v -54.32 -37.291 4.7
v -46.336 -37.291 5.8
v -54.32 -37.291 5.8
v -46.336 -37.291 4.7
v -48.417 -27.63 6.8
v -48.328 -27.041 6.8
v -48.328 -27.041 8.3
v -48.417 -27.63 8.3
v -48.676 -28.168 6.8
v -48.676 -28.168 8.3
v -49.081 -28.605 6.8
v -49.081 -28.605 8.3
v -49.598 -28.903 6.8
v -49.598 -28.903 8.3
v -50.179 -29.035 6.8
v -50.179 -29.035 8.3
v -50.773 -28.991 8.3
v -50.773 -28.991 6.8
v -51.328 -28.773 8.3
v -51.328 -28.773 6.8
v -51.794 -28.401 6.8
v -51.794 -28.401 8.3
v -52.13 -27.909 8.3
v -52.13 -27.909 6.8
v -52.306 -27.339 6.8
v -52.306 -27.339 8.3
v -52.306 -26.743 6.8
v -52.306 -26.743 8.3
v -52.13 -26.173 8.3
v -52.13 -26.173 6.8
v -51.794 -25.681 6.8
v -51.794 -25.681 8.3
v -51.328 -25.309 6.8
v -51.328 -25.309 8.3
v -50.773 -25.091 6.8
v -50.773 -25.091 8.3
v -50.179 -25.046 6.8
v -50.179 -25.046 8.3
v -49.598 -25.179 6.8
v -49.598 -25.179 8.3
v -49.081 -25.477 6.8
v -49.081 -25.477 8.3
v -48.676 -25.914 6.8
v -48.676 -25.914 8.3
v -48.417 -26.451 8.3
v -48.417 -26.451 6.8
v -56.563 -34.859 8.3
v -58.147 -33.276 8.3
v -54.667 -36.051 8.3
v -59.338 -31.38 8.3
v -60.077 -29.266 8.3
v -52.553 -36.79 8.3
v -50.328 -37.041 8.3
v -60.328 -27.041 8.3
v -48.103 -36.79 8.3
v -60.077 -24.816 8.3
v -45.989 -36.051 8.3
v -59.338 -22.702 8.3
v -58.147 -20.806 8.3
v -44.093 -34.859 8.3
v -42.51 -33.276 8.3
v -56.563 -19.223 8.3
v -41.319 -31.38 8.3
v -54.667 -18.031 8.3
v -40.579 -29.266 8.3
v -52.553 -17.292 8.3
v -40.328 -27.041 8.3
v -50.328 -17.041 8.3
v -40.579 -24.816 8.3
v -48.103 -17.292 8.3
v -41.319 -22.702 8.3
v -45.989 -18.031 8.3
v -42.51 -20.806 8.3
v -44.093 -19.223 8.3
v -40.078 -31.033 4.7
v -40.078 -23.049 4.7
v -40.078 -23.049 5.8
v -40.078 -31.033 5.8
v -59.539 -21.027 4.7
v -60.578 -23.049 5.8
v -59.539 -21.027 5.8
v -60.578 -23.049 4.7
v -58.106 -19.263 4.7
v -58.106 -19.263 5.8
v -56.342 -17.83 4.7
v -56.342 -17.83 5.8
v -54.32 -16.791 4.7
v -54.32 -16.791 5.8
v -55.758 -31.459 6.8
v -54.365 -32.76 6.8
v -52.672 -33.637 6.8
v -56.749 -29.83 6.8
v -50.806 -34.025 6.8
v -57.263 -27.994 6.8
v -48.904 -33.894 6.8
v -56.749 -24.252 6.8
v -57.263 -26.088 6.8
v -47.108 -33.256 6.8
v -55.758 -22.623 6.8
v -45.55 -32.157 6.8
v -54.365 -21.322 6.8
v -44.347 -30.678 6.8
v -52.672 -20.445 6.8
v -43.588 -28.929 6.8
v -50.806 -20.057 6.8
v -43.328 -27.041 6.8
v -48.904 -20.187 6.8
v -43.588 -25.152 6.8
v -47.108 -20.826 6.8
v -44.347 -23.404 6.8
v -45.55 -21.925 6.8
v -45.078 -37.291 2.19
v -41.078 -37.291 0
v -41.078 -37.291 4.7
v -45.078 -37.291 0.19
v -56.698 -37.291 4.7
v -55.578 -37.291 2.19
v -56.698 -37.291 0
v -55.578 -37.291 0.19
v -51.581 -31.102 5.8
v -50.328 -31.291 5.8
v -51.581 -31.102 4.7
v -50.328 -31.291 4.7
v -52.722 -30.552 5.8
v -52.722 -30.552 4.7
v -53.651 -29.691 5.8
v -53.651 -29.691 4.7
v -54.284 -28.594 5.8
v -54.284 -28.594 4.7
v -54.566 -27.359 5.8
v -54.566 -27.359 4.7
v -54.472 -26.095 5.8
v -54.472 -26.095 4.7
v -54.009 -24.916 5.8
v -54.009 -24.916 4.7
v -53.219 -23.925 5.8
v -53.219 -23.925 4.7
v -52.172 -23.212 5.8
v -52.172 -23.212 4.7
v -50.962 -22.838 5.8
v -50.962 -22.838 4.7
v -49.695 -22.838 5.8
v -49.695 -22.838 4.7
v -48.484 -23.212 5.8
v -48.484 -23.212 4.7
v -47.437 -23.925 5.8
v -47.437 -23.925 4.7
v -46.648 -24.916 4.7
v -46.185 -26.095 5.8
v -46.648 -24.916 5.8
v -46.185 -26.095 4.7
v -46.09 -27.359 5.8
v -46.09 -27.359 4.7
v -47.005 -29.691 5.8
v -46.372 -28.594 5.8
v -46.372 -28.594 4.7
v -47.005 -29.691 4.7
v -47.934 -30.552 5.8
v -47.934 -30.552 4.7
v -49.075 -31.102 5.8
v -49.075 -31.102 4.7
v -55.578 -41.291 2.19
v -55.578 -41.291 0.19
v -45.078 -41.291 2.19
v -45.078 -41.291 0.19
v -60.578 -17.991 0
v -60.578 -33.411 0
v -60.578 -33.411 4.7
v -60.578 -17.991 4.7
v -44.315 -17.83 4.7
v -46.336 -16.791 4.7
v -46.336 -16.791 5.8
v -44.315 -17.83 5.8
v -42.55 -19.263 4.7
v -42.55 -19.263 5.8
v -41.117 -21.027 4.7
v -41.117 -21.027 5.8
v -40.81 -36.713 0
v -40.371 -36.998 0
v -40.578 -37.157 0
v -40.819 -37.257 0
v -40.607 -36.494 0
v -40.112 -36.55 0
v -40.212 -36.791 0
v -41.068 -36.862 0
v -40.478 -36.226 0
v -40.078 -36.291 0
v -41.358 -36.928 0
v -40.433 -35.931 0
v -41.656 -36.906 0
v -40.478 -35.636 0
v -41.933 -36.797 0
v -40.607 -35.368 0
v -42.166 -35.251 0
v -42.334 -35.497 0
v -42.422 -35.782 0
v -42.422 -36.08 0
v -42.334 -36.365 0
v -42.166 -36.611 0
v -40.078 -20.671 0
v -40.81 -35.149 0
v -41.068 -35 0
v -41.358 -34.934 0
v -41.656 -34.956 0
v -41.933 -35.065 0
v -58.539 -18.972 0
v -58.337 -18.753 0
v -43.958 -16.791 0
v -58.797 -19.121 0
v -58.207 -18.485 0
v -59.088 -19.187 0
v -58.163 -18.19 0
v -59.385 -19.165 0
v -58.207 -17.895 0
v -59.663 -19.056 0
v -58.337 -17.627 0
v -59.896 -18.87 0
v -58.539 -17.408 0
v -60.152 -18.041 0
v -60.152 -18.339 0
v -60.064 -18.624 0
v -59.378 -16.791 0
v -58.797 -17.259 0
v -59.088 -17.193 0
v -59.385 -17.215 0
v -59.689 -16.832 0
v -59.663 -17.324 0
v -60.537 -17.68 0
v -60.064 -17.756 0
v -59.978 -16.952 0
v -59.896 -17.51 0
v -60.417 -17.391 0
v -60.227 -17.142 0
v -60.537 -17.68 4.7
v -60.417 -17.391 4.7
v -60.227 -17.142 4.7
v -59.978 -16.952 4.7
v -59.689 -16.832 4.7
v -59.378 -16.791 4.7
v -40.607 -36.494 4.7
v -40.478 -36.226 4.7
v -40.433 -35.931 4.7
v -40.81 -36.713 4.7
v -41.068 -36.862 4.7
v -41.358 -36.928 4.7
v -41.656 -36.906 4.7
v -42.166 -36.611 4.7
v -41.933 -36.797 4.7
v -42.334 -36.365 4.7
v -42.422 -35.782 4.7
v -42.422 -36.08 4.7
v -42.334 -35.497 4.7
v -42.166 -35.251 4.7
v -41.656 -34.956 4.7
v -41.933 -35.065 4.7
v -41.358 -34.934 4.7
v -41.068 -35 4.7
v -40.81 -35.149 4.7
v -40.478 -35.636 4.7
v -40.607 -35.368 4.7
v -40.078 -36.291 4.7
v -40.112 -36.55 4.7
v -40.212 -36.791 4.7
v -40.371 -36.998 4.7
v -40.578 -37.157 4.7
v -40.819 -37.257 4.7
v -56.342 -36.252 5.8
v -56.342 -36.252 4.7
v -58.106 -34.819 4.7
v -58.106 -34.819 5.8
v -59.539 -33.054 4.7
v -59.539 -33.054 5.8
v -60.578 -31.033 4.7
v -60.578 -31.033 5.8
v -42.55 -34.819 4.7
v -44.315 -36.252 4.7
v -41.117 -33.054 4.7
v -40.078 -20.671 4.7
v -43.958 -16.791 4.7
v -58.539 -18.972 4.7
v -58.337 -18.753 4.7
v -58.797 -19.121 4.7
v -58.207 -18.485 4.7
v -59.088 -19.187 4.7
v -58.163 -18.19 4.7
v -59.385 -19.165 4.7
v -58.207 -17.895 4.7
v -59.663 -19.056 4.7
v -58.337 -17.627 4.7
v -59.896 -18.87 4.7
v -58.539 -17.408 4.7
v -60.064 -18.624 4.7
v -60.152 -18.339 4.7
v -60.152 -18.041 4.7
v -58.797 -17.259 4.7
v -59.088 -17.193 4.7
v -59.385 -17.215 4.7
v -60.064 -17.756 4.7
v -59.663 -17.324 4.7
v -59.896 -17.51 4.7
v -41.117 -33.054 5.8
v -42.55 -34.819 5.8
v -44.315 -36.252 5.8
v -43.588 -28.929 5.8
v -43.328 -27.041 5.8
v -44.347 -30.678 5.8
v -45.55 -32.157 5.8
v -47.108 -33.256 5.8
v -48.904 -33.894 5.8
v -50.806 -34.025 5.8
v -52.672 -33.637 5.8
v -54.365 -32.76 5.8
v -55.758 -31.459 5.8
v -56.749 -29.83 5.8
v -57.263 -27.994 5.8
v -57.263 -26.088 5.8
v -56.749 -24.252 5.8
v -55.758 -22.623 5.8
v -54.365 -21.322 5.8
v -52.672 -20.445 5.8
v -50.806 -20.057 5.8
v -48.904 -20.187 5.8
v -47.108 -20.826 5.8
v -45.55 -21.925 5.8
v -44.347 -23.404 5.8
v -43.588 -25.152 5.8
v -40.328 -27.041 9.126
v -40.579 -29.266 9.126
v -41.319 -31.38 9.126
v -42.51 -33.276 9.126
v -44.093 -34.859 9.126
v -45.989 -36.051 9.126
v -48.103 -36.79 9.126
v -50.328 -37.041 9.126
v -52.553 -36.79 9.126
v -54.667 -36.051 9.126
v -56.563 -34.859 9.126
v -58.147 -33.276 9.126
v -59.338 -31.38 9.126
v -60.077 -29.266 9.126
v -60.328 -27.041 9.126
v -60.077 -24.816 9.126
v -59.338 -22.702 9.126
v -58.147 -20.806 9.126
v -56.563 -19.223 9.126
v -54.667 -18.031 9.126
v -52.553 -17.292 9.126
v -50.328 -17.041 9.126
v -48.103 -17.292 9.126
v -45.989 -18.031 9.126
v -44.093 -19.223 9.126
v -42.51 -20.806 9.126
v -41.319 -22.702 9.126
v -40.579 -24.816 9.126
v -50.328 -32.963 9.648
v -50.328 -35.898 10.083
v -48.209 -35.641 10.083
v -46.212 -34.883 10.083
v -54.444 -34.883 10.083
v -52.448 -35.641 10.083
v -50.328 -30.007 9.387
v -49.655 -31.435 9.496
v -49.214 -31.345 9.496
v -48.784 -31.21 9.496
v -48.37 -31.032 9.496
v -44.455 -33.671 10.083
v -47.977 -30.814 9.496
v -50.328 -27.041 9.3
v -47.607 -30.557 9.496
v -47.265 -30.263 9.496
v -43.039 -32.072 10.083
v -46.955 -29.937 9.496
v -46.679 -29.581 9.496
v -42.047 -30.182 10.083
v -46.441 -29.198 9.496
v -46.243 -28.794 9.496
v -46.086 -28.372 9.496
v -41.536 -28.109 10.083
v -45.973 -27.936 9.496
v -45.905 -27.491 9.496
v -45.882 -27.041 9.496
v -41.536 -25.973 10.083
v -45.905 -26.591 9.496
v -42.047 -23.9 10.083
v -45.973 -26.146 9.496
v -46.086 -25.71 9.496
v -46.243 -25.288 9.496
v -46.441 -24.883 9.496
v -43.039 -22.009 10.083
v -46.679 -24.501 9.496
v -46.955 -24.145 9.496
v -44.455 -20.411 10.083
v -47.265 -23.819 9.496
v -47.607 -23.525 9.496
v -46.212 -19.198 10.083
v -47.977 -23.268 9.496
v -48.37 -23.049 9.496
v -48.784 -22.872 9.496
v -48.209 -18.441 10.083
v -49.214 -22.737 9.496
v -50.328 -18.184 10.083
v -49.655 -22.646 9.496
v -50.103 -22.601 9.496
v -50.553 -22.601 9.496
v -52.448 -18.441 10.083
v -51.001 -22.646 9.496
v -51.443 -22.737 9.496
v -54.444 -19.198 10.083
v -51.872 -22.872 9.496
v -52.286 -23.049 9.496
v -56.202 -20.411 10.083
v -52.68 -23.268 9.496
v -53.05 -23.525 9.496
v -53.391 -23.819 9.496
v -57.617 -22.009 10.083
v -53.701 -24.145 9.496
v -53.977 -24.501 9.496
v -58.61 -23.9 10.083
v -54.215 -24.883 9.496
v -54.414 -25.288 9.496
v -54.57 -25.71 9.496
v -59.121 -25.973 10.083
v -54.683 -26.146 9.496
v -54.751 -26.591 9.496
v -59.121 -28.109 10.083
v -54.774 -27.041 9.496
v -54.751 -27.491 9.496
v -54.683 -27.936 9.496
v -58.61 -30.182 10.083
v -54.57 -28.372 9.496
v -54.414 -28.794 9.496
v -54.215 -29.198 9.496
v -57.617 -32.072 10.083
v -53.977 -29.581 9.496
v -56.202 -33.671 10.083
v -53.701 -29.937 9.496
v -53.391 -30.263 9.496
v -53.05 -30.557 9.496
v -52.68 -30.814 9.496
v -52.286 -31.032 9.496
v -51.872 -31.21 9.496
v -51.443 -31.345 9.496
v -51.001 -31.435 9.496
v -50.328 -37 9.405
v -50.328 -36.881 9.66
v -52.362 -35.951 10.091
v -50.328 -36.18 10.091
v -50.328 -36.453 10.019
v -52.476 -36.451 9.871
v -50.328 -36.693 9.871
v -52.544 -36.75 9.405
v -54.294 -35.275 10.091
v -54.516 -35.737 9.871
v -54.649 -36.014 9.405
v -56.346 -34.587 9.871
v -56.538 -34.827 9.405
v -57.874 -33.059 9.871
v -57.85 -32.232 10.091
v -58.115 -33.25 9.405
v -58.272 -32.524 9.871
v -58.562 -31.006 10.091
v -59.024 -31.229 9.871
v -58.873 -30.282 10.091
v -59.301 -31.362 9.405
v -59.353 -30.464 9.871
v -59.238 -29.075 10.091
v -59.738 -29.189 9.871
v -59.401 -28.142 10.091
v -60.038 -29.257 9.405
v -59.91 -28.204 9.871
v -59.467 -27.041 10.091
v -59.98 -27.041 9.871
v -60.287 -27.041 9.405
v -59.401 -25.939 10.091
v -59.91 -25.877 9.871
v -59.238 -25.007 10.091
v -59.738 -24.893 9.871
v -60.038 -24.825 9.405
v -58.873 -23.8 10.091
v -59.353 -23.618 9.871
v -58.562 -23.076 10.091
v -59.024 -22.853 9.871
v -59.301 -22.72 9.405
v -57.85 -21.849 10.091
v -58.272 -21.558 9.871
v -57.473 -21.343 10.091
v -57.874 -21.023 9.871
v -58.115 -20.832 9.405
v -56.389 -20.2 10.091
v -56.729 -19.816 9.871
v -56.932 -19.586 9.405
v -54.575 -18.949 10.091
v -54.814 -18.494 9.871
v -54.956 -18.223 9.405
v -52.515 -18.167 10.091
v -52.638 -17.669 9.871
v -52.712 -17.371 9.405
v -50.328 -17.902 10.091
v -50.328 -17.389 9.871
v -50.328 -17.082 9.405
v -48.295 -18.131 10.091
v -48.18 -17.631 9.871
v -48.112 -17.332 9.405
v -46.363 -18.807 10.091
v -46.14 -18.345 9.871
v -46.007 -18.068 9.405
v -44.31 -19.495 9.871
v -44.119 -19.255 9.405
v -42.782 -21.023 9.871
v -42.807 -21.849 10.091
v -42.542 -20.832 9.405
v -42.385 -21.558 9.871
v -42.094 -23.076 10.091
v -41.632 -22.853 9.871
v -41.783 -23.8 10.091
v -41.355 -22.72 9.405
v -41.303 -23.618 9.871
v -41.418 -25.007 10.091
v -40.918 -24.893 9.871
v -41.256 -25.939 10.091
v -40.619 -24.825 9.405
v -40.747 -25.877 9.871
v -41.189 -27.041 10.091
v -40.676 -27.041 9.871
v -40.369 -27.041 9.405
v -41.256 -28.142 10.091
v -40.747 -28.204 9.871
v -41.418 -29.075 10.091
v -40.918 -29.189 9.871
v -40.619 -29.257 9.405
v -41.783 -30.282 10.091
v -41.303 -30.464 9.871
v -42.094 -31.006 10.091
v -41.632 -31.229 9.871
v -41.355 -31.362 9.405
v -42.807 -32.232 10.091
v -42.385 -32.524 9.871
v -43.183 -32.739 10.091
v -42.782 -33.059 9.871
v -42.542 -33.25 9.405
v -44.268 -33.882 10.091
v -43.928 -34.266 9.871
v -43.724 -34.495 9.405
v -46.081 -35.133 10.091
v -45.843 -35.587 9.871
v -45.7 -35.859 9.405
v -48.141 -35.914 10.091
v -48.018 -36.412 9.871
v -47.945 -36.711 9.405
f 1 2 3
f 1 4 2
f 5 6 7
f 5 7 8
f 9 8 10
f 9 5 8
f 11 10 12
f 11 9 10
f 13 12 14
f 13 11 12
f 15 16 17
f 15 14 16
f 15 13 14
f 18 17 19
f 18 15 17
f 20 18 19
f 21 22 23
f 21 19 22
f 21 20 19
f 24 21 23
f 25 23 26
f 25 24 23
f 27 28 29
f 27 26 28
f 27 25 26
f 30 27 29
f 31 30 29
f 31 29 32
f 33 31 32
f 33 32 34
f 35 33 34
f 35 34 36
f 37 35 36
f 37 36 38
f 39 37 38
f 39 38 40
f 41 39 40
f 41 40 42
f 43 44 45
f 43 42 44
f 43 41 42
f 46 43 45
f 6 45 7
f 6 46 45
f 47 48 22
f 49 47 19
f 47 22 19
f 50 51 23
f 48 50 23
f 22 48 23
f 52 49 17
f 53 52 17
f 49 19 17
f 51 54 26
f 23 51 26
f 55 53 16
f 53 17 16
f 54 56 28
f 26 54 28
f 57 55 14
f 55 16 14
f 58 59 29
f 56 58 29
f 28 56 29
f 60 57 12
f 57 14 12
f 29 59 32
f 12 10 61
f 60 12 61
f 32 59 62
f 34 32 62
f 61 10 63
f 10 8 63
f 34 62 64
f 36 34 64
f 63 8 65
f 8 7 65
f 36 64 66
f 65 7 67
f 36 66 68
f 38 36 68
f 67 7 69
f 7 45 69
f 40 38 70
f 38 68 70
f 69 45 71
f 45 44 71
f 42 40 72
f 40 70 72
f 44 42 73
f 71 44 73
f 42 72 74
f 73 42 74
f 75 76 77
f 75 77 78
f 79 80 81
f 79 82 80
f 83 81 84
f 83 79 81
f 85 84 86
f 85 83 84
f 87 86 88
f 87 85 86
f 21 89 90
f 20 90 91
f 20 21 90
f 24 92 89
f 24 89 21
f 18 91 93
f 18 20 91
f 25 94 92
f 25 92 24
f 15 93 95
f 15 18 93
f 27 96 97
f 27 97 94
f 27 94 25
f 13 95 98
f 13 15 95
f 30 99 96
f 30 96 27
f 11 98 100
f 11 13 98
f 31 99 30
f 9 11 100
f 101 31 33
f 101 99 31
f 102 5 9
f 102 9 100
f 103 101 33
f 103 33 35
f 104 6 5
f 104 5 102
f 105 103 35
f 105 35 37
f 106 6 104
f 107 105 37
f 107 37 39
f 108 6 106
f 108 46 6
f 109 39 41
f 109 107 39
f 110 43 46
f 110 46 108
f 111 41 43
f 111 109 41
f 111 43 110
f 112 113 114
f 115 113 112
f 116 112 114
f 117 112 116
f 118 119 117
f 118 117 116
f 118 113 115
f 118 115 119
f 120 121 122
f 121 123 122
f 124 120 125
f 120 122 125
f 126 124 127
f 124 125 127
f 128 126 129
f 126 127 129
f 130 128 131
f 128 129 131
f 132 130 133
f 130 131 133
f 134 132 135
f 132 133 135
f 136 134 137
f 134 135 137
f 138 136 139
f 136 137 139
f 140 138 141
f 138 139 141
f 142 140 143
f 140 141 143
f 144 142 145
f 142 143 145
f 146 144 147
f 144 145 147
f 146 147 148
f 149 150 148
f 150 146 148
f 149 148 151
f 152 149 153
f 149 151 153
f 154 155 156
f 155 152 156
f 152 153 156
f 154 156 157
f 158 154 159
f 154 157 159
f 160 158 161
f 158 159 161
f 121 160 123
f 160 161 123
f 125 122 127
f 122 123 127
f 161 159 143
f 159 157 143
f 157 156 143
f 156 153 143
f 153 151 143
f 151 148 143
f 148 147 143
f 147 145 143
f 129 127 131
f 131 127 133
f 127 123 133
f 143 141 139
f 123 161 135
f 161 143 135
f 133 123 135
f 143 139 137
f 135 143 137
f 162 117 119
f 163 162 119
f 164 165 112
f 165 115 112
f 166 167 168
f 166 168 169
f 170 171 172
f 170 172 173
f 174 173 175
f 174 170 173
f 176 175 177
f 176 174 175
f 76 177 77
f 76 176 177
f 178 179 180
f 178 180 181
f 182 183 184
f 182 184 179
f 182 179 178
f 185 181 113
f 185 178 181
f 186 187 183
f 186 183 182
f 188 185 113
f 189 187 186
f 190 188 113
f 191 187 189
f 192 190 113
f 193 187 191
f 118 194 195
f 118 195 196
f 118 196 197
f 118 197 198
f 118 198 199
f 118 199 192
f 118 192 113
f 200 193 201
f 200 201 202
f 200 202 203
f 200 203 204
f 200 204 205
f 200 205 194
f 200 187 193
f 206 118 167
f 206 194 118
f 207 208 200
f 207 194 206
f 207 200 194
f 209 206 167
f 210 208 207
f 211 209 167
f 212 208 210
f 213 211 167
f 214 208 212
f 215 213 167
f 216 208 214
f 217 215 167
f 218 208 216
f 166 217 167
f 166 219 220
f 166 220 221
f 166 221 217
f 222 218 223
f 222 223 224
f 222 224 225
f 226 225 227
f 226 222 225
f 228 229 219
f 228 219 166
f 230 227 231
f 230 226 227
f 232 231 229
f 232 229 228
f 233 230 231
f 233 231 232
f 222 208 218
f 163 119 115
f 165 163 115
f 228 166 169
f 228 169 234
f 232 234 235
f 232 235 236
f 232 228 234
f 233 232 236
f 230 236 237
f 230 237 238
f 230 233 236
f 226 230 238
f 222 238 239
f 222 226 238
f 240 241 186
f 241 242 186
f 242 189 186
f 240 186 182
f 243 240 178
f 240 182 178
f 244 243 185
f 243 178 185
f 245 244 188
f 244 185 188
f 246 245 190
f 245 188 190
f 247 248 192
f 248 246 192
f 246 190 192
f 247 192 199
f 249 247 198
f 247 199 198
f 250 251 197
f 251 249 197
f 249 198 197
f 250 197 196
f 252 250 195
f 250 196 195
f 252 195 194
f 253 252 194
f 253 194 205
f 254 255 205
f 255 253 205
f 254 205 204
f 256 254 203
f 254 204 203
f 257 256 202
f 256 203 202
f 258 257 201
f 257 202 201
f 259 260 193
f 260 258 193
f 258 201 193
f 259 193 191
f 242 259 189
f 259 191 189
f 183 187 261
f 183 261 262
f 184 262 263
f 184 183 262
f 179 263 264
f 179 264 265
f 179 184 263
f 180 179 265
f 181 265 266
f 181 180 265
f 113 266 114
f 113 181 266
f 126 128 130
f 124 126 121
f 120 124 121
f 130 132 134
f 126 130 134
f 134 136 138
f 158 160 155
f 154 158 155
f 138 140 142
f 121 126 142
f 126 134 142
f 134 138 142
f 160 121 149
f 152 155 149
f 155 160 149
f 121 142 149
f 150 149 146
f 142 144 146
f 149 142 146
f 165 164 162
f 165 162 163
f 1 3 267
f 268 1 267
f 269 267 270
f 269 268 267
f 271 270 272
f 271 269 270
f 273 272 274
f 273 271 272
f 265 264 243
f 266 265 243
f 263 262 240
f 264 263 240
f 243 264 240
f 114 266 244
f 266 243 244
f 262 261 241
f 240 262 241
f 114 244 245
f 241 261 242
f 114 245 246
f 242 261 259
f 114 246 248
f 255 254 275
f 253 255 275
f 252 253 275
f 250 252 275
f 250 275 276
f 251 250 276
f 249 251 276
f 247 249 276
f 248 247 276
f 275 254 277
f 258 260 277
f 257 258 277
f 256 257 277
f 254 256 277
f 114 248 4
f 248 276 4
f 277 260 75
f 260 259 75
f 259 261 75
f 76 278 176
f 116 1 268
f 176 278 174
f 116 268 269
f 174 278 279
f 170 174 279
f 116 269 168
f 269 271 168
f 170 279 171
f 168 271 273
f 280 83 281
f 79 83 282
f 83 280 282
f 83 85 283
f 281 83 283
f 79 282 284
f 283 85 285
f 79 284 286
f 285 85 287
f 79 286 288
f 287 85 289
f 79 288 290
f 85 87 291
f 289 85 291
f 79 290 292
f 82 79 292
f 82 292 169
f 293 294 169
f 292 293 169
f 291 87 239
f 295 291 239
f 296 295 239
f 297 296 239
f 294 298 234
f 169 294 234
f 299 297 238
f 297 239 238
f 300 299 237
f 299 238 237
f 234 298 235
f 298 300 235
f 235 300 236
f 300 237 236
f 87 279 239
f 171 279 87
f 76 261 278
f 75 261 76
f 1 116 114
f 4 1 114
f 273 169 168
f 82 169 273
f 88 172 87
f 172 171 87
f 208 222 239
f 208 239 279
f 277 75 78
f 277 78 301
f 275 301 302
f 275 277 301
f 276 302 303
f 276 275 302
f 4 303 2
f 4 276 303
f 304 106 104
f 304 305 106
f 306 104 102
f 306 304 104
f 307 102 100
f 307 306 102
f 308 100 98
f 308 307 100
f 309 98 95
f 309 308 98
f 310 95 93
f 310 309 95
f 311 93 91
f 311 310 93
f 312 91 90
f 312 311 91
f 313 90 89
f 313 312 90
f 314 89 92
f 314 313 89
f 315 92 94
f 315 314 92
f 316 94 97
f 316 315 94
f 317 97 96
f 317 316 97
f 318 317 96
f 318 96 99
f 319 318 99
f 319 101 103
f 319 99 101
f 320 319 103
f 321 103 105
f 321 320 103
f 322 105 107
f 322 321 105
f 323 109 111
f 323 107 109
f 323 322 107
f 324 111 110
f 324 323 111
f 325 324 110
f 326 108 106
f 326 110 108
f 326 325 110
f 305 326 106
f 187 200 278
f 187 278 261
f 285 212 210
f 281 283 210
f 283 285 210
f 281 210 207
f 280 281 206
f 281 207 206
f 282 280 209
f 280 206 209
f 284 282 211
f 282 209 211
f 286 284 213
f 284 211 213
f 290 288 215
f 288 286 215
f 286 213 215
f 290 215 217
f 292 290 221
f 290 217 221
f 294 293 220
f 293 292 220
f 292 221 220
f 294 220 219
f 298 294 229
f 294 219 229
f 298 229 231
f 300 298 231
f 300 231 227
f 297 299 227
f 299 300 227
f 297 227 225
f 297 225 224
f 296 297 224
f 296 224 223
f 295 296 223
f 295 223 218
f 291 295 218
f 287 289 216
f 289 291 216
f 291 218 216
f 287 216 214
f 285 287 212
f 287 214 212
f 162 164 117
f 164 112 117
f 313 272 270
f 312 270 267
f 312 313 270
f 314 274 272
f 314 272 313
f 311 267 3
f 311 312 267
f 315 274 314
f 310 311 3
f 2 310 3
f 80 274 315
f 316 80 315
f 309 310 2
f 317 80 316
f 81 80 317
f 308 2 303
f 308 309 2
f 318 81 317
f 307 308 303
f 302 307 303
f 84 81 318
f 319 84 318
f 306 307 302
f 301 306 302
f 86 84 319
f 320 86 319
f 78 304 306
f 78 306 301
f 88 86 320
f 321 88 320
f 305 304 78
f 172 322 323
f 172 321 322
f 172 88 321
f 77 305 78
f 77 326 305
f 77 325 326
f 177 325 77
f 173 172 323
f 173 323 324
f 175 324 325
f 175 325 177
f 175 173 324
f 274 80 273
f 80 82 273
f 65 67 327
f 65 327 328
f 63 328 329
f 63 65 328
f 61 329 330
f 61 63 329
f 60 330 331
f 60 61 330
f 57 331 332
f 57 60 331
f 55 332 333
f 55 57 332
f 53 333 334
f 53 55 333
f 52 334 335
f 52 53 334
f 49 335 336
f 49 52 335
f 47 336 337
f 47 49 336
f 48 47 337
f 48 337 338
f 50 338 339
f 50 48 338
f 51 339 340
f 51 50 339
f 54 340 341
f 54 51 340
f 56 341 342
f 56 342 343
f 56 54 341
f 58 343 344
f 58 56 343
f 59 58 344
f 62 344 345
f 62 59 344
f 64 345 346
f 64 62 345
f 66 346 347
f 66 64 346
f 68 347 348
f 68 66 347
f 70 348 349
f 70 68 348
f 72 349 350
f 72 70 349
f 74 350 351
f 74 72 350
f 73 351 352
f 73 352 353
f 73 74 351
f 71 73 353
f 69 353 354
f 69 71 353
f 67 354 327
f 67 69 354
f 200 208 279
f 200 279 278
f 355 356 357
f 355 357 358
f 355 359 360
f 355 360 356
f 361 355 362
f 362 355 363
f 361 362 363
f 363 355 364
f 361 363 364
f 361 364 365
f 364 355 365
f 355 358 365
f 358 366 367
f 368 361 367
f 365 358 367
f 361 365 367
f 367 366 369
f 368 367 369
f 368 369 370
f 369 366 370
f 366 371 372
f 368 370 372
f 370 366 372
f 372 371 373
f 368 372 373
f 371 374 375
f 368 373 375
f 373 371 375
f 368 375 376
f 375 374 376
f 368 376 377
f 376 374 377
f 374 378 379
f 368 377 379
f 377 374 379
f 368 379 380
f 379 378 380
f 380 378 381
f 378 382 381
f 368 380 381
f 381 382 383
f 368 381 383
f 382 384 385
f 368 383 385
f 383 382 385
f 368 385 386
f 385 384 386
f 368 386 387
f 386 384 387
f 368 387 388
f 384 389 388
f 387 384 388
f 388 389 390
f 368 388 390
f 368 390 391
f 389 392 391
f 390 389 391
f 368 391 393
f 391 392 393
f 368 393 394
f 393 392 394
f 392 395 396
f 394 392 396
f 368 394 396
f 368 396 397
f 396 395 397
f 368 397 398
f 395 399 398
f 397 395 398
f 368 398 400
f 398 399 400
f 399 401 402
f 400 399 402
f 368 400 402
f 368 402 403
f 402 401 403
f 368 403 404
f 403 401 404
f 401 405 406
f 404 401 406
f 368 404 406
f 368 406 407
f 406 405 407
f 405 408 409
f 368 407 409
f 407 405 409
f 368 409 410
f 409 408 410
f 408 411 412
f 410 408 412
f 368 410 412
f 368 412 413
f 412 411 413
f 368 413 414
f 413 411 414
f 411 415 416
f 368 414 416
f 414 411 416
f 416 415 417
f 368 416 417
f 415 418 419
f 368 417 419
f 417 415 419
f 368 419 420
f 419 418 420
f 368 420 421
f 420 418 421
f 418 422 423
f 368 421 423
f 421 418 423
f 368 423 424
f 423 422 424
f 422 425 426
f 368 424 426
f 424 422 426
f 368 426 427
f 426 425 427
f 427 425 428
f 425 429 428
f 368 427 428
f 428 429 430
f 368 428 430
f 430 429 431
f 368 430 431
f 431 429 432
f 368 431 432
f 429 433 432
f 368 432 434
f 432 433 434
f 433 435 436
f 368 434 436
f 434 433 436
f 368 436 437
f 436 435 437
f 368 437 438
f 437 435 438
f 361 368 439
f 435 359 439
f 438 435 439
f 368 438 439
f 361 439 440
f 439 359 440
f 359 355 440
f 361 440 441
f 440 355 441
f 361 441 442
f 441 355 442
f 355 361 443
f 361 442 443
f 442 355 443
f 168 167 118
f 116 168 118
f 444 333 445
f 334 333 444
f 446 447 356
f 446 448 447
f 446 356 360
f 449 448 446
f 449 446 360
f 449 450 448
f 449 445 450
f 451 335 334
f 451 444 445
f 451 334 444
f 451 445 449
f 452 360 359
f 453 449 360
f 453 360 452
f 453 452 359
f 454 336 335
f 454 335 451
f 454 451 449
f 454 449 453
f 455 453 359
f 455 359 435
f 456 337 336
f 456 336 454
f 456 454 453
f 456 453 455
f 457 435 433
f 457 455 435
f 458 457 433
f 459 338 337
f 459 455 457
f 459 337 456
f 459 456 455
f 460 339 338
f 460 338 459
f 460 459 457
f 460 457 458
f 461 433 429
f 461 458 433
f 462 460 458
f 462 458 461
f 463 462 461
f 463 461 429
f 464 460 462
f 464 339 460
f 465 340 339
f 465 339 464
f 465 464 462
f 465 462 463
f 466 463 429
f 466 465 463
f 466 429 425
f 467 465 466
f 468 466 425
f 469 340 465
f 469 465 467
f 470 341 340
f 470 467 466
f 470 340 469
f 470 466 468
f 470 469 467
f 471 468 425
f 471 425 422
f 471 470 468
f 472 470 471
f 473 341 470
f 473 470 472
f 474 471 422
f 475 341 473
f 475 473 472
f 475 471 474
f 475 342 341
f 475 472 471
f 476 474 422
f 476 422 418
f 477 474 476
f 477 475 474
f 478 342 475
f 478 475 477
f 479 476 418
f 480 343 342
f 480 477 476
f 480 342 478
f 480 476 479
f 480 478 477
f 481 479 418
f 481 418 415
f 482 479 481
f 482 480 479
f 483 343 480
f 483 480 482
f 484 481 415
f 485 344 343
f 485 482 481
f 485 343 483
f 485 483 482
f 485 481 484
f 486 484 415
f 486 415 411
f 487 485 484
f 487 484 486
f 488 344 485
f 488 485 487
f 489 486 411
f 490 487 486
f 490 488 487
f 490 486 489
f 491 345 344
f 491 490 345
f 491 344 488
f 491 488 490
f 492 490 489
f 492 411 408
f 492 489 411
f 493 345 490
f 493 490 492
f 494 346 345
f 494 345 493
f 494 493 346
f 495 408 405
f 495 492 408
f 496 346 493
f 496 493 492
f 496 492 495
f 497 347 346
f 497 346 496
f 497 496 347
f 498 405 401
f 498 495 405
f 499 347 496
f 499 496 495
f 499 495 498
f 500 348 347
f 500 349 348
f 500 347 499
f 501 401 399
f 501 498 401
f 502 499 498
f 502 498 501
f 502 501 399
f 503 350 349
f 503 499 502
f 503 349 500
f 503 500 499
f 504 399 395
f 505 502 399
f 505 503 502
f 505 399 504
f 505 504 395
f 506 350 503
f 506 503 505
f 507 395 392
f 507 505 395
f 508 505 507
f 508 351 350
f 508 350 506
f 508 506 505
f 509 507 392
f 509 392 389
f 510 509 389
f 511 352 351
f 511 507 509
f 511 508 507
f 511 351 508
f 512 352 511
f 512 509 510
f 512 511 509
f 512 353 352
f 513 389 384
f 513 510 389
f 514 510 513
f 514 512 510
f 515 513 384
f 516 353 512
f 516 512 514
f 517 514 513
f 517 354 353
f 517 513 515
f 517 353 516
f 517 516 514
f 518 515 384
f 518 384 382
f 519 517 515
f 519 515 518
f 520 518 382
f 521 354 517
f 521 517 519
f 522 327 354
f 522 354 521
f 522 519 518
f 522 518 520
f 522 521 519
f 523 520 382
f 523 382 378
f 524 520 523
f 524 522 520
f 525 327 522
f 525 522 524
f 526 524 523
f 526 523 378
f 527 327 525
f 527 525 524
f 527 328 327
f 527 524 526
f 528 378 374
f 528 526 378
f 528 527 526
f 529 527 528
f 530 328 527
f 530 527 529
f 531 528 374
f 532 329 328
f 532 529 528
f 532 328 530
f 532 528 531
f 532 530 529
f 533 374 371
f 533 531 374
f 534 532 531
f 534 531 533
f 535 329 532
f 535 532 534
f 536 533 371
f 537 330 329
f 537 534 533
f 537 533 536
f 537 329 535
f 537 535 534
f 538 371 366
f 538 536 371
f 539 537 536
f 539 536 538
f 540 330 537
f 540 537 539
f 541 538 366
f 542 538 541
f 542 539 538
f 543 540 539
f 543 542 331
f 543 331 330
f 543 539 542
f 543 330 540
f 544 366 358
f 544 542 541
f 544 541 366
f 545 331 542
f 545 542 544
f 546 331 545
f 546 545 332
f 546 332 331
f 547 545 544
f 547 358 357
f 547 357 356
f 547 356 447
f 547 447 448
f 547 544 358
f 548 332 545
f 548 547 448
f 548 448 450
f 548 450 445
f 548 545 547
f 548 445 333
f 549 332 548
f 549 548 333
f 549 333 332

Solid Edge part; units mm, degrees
sketch "Sketch1" plane through (0, 0, 0) normal (0, 0, 1) x (1, 0, 0)
  circle A0 centre (-59.1628, -18.1899) radius 1
  line L0 (-40.0782, -20.6709) -> (-40.0782, -36.2909)
  arc A1 (-40.0782, -36.2909) -> (-41.0782, -37.2909) centre (-41.0782, -36.2909) cw
  line L1 (-41.0782, -37.2909) -> (-56.6982, -37.2909)
  line L2 (-60.5782, -33.4109) -> (-56.6982, -37.2909)
  line L3 (-60.5782, -33.4109) -> (-60.5782, -17.9909)
  arc A2 (-60.5782, -17.9909) -> (-59.3782, -16.7909) centre (-59.3782, -17.9909) cw
  line L4 (-59.3782, -16.7909) -> (-43.9582, -16.7909)
  line L5 (-43.9582, -16.7909) -> (-40.0782, -20.6709)
  circle A3 centre (-41.4332, -35.9309) radius 1
extrude "Protrusion1" add sketch "Sketch1" along normal blind 4.7
sketch "Sketch2" plane through (-50.3282, -27.0409, 4.7) normal (0, 0, 1) x (0, -1, 0)
  circle A0 centre (0, 0) radius 4.25
  arc A1 (-10.25, -3.9922) -> (-3.9922, -10.25) centre (0, 0) ccw
  line L0 (-3.9922, -10.25) -> (3.9922, -10.25)
  arc A2 (3.9922, -10.25) -> (10.25, -3.9922) centre (0, 0) ccw
  line L1 (10.25, 3.9922) -> (10.25, -3.9922)
  arc A3 (3.9922, 10.25) -> (10.25, 3.9922) centre (0, 0) cw
  line L2 (-3.9922, 10.25) -> (3.9922, 10.25)
  arc A4 (-3.9922, 10.25) -> (-10.25, 3.9922) centre (0, 0) ccw
  line L3 (-10.25, 3.9922) -> (-10.25, -3.9922)
extrude "ExtrudedProtrusion_2" add sketch "Sketch2" along normal blind 1.1
sketch "Sketch3" plane through (-50.3282, -27.0409, 5.8) normal (0, 0, 1) x (1, 0, 0)
  circle A0 centre (0, 0) radius 7
extrude "ExtrudedProtrusion_3" add sketch "Sketch3" along normal blind 1
sketch "Sketch4" plane through (-50.3282, -27.0409, 6.8) normal (0, 0, 1) x (1, 0, 0)
  circle A0 centre (0, 0) radius 2
extrude "ExtrudedProtrusion_4" add sketch "Sketch4" along normal blind 1.5
sketch "Sketch5" plane through (-50.3282, -27.0409, 8.3) normal (0, 0, 1) x (1, 0, 0)
  circle A0 centre (0, 0) radius 10
extrude "ExtrudedProtrusion_5" add sketch "Sketch5" along normal blind 2
sketch "Sketch6" plane through (-50.3282, 0, 0) normal (1, 0, 0) x (0, 1, 0)
  line L0 (-37.0409, 9.1255) -> (-37.0409, 10.3)
  line L1 (-37.0409, 10.3) -> (-27.0409, 10.3)
  line L2 (-27.0409, 10.3) -> (-27.0409, 4.8545)
  arc A0 (-27.0409, 9.3) -> (-35.898, 10.0828) centre (-27.0409, 59.8) cw
  arc A1 (-35.898, 10.0828) -> (-37.0409, 9.1255) centre (-36.0685, 9.1255) ccw
revolve "RevolvedCutout1" cut sketch "Sketch6" angle 360 about axis through (-50.3282, -27.0409, 10.3) along (0, 0, -1)
sketch "Sketch7" plane through (-48.8882, -37.2909, 2.9) normal (0, -1, 0) x (1, 0, 0)
  line L0 (-6.69, -0.7104) -> (-6.69, -2.7104)
  line L1 (-6.69, -2.7104) -> (3.81, -2.7104)
  line L2 (3.81, -2.7104) -> (3.81, -0.7104)
  line L3 (3.81, -0.7104) -> (-6.69, -0.7104)
extrude "ExtrudedProtrusion_6" add sketch "Sketch7" along normal blind 4
